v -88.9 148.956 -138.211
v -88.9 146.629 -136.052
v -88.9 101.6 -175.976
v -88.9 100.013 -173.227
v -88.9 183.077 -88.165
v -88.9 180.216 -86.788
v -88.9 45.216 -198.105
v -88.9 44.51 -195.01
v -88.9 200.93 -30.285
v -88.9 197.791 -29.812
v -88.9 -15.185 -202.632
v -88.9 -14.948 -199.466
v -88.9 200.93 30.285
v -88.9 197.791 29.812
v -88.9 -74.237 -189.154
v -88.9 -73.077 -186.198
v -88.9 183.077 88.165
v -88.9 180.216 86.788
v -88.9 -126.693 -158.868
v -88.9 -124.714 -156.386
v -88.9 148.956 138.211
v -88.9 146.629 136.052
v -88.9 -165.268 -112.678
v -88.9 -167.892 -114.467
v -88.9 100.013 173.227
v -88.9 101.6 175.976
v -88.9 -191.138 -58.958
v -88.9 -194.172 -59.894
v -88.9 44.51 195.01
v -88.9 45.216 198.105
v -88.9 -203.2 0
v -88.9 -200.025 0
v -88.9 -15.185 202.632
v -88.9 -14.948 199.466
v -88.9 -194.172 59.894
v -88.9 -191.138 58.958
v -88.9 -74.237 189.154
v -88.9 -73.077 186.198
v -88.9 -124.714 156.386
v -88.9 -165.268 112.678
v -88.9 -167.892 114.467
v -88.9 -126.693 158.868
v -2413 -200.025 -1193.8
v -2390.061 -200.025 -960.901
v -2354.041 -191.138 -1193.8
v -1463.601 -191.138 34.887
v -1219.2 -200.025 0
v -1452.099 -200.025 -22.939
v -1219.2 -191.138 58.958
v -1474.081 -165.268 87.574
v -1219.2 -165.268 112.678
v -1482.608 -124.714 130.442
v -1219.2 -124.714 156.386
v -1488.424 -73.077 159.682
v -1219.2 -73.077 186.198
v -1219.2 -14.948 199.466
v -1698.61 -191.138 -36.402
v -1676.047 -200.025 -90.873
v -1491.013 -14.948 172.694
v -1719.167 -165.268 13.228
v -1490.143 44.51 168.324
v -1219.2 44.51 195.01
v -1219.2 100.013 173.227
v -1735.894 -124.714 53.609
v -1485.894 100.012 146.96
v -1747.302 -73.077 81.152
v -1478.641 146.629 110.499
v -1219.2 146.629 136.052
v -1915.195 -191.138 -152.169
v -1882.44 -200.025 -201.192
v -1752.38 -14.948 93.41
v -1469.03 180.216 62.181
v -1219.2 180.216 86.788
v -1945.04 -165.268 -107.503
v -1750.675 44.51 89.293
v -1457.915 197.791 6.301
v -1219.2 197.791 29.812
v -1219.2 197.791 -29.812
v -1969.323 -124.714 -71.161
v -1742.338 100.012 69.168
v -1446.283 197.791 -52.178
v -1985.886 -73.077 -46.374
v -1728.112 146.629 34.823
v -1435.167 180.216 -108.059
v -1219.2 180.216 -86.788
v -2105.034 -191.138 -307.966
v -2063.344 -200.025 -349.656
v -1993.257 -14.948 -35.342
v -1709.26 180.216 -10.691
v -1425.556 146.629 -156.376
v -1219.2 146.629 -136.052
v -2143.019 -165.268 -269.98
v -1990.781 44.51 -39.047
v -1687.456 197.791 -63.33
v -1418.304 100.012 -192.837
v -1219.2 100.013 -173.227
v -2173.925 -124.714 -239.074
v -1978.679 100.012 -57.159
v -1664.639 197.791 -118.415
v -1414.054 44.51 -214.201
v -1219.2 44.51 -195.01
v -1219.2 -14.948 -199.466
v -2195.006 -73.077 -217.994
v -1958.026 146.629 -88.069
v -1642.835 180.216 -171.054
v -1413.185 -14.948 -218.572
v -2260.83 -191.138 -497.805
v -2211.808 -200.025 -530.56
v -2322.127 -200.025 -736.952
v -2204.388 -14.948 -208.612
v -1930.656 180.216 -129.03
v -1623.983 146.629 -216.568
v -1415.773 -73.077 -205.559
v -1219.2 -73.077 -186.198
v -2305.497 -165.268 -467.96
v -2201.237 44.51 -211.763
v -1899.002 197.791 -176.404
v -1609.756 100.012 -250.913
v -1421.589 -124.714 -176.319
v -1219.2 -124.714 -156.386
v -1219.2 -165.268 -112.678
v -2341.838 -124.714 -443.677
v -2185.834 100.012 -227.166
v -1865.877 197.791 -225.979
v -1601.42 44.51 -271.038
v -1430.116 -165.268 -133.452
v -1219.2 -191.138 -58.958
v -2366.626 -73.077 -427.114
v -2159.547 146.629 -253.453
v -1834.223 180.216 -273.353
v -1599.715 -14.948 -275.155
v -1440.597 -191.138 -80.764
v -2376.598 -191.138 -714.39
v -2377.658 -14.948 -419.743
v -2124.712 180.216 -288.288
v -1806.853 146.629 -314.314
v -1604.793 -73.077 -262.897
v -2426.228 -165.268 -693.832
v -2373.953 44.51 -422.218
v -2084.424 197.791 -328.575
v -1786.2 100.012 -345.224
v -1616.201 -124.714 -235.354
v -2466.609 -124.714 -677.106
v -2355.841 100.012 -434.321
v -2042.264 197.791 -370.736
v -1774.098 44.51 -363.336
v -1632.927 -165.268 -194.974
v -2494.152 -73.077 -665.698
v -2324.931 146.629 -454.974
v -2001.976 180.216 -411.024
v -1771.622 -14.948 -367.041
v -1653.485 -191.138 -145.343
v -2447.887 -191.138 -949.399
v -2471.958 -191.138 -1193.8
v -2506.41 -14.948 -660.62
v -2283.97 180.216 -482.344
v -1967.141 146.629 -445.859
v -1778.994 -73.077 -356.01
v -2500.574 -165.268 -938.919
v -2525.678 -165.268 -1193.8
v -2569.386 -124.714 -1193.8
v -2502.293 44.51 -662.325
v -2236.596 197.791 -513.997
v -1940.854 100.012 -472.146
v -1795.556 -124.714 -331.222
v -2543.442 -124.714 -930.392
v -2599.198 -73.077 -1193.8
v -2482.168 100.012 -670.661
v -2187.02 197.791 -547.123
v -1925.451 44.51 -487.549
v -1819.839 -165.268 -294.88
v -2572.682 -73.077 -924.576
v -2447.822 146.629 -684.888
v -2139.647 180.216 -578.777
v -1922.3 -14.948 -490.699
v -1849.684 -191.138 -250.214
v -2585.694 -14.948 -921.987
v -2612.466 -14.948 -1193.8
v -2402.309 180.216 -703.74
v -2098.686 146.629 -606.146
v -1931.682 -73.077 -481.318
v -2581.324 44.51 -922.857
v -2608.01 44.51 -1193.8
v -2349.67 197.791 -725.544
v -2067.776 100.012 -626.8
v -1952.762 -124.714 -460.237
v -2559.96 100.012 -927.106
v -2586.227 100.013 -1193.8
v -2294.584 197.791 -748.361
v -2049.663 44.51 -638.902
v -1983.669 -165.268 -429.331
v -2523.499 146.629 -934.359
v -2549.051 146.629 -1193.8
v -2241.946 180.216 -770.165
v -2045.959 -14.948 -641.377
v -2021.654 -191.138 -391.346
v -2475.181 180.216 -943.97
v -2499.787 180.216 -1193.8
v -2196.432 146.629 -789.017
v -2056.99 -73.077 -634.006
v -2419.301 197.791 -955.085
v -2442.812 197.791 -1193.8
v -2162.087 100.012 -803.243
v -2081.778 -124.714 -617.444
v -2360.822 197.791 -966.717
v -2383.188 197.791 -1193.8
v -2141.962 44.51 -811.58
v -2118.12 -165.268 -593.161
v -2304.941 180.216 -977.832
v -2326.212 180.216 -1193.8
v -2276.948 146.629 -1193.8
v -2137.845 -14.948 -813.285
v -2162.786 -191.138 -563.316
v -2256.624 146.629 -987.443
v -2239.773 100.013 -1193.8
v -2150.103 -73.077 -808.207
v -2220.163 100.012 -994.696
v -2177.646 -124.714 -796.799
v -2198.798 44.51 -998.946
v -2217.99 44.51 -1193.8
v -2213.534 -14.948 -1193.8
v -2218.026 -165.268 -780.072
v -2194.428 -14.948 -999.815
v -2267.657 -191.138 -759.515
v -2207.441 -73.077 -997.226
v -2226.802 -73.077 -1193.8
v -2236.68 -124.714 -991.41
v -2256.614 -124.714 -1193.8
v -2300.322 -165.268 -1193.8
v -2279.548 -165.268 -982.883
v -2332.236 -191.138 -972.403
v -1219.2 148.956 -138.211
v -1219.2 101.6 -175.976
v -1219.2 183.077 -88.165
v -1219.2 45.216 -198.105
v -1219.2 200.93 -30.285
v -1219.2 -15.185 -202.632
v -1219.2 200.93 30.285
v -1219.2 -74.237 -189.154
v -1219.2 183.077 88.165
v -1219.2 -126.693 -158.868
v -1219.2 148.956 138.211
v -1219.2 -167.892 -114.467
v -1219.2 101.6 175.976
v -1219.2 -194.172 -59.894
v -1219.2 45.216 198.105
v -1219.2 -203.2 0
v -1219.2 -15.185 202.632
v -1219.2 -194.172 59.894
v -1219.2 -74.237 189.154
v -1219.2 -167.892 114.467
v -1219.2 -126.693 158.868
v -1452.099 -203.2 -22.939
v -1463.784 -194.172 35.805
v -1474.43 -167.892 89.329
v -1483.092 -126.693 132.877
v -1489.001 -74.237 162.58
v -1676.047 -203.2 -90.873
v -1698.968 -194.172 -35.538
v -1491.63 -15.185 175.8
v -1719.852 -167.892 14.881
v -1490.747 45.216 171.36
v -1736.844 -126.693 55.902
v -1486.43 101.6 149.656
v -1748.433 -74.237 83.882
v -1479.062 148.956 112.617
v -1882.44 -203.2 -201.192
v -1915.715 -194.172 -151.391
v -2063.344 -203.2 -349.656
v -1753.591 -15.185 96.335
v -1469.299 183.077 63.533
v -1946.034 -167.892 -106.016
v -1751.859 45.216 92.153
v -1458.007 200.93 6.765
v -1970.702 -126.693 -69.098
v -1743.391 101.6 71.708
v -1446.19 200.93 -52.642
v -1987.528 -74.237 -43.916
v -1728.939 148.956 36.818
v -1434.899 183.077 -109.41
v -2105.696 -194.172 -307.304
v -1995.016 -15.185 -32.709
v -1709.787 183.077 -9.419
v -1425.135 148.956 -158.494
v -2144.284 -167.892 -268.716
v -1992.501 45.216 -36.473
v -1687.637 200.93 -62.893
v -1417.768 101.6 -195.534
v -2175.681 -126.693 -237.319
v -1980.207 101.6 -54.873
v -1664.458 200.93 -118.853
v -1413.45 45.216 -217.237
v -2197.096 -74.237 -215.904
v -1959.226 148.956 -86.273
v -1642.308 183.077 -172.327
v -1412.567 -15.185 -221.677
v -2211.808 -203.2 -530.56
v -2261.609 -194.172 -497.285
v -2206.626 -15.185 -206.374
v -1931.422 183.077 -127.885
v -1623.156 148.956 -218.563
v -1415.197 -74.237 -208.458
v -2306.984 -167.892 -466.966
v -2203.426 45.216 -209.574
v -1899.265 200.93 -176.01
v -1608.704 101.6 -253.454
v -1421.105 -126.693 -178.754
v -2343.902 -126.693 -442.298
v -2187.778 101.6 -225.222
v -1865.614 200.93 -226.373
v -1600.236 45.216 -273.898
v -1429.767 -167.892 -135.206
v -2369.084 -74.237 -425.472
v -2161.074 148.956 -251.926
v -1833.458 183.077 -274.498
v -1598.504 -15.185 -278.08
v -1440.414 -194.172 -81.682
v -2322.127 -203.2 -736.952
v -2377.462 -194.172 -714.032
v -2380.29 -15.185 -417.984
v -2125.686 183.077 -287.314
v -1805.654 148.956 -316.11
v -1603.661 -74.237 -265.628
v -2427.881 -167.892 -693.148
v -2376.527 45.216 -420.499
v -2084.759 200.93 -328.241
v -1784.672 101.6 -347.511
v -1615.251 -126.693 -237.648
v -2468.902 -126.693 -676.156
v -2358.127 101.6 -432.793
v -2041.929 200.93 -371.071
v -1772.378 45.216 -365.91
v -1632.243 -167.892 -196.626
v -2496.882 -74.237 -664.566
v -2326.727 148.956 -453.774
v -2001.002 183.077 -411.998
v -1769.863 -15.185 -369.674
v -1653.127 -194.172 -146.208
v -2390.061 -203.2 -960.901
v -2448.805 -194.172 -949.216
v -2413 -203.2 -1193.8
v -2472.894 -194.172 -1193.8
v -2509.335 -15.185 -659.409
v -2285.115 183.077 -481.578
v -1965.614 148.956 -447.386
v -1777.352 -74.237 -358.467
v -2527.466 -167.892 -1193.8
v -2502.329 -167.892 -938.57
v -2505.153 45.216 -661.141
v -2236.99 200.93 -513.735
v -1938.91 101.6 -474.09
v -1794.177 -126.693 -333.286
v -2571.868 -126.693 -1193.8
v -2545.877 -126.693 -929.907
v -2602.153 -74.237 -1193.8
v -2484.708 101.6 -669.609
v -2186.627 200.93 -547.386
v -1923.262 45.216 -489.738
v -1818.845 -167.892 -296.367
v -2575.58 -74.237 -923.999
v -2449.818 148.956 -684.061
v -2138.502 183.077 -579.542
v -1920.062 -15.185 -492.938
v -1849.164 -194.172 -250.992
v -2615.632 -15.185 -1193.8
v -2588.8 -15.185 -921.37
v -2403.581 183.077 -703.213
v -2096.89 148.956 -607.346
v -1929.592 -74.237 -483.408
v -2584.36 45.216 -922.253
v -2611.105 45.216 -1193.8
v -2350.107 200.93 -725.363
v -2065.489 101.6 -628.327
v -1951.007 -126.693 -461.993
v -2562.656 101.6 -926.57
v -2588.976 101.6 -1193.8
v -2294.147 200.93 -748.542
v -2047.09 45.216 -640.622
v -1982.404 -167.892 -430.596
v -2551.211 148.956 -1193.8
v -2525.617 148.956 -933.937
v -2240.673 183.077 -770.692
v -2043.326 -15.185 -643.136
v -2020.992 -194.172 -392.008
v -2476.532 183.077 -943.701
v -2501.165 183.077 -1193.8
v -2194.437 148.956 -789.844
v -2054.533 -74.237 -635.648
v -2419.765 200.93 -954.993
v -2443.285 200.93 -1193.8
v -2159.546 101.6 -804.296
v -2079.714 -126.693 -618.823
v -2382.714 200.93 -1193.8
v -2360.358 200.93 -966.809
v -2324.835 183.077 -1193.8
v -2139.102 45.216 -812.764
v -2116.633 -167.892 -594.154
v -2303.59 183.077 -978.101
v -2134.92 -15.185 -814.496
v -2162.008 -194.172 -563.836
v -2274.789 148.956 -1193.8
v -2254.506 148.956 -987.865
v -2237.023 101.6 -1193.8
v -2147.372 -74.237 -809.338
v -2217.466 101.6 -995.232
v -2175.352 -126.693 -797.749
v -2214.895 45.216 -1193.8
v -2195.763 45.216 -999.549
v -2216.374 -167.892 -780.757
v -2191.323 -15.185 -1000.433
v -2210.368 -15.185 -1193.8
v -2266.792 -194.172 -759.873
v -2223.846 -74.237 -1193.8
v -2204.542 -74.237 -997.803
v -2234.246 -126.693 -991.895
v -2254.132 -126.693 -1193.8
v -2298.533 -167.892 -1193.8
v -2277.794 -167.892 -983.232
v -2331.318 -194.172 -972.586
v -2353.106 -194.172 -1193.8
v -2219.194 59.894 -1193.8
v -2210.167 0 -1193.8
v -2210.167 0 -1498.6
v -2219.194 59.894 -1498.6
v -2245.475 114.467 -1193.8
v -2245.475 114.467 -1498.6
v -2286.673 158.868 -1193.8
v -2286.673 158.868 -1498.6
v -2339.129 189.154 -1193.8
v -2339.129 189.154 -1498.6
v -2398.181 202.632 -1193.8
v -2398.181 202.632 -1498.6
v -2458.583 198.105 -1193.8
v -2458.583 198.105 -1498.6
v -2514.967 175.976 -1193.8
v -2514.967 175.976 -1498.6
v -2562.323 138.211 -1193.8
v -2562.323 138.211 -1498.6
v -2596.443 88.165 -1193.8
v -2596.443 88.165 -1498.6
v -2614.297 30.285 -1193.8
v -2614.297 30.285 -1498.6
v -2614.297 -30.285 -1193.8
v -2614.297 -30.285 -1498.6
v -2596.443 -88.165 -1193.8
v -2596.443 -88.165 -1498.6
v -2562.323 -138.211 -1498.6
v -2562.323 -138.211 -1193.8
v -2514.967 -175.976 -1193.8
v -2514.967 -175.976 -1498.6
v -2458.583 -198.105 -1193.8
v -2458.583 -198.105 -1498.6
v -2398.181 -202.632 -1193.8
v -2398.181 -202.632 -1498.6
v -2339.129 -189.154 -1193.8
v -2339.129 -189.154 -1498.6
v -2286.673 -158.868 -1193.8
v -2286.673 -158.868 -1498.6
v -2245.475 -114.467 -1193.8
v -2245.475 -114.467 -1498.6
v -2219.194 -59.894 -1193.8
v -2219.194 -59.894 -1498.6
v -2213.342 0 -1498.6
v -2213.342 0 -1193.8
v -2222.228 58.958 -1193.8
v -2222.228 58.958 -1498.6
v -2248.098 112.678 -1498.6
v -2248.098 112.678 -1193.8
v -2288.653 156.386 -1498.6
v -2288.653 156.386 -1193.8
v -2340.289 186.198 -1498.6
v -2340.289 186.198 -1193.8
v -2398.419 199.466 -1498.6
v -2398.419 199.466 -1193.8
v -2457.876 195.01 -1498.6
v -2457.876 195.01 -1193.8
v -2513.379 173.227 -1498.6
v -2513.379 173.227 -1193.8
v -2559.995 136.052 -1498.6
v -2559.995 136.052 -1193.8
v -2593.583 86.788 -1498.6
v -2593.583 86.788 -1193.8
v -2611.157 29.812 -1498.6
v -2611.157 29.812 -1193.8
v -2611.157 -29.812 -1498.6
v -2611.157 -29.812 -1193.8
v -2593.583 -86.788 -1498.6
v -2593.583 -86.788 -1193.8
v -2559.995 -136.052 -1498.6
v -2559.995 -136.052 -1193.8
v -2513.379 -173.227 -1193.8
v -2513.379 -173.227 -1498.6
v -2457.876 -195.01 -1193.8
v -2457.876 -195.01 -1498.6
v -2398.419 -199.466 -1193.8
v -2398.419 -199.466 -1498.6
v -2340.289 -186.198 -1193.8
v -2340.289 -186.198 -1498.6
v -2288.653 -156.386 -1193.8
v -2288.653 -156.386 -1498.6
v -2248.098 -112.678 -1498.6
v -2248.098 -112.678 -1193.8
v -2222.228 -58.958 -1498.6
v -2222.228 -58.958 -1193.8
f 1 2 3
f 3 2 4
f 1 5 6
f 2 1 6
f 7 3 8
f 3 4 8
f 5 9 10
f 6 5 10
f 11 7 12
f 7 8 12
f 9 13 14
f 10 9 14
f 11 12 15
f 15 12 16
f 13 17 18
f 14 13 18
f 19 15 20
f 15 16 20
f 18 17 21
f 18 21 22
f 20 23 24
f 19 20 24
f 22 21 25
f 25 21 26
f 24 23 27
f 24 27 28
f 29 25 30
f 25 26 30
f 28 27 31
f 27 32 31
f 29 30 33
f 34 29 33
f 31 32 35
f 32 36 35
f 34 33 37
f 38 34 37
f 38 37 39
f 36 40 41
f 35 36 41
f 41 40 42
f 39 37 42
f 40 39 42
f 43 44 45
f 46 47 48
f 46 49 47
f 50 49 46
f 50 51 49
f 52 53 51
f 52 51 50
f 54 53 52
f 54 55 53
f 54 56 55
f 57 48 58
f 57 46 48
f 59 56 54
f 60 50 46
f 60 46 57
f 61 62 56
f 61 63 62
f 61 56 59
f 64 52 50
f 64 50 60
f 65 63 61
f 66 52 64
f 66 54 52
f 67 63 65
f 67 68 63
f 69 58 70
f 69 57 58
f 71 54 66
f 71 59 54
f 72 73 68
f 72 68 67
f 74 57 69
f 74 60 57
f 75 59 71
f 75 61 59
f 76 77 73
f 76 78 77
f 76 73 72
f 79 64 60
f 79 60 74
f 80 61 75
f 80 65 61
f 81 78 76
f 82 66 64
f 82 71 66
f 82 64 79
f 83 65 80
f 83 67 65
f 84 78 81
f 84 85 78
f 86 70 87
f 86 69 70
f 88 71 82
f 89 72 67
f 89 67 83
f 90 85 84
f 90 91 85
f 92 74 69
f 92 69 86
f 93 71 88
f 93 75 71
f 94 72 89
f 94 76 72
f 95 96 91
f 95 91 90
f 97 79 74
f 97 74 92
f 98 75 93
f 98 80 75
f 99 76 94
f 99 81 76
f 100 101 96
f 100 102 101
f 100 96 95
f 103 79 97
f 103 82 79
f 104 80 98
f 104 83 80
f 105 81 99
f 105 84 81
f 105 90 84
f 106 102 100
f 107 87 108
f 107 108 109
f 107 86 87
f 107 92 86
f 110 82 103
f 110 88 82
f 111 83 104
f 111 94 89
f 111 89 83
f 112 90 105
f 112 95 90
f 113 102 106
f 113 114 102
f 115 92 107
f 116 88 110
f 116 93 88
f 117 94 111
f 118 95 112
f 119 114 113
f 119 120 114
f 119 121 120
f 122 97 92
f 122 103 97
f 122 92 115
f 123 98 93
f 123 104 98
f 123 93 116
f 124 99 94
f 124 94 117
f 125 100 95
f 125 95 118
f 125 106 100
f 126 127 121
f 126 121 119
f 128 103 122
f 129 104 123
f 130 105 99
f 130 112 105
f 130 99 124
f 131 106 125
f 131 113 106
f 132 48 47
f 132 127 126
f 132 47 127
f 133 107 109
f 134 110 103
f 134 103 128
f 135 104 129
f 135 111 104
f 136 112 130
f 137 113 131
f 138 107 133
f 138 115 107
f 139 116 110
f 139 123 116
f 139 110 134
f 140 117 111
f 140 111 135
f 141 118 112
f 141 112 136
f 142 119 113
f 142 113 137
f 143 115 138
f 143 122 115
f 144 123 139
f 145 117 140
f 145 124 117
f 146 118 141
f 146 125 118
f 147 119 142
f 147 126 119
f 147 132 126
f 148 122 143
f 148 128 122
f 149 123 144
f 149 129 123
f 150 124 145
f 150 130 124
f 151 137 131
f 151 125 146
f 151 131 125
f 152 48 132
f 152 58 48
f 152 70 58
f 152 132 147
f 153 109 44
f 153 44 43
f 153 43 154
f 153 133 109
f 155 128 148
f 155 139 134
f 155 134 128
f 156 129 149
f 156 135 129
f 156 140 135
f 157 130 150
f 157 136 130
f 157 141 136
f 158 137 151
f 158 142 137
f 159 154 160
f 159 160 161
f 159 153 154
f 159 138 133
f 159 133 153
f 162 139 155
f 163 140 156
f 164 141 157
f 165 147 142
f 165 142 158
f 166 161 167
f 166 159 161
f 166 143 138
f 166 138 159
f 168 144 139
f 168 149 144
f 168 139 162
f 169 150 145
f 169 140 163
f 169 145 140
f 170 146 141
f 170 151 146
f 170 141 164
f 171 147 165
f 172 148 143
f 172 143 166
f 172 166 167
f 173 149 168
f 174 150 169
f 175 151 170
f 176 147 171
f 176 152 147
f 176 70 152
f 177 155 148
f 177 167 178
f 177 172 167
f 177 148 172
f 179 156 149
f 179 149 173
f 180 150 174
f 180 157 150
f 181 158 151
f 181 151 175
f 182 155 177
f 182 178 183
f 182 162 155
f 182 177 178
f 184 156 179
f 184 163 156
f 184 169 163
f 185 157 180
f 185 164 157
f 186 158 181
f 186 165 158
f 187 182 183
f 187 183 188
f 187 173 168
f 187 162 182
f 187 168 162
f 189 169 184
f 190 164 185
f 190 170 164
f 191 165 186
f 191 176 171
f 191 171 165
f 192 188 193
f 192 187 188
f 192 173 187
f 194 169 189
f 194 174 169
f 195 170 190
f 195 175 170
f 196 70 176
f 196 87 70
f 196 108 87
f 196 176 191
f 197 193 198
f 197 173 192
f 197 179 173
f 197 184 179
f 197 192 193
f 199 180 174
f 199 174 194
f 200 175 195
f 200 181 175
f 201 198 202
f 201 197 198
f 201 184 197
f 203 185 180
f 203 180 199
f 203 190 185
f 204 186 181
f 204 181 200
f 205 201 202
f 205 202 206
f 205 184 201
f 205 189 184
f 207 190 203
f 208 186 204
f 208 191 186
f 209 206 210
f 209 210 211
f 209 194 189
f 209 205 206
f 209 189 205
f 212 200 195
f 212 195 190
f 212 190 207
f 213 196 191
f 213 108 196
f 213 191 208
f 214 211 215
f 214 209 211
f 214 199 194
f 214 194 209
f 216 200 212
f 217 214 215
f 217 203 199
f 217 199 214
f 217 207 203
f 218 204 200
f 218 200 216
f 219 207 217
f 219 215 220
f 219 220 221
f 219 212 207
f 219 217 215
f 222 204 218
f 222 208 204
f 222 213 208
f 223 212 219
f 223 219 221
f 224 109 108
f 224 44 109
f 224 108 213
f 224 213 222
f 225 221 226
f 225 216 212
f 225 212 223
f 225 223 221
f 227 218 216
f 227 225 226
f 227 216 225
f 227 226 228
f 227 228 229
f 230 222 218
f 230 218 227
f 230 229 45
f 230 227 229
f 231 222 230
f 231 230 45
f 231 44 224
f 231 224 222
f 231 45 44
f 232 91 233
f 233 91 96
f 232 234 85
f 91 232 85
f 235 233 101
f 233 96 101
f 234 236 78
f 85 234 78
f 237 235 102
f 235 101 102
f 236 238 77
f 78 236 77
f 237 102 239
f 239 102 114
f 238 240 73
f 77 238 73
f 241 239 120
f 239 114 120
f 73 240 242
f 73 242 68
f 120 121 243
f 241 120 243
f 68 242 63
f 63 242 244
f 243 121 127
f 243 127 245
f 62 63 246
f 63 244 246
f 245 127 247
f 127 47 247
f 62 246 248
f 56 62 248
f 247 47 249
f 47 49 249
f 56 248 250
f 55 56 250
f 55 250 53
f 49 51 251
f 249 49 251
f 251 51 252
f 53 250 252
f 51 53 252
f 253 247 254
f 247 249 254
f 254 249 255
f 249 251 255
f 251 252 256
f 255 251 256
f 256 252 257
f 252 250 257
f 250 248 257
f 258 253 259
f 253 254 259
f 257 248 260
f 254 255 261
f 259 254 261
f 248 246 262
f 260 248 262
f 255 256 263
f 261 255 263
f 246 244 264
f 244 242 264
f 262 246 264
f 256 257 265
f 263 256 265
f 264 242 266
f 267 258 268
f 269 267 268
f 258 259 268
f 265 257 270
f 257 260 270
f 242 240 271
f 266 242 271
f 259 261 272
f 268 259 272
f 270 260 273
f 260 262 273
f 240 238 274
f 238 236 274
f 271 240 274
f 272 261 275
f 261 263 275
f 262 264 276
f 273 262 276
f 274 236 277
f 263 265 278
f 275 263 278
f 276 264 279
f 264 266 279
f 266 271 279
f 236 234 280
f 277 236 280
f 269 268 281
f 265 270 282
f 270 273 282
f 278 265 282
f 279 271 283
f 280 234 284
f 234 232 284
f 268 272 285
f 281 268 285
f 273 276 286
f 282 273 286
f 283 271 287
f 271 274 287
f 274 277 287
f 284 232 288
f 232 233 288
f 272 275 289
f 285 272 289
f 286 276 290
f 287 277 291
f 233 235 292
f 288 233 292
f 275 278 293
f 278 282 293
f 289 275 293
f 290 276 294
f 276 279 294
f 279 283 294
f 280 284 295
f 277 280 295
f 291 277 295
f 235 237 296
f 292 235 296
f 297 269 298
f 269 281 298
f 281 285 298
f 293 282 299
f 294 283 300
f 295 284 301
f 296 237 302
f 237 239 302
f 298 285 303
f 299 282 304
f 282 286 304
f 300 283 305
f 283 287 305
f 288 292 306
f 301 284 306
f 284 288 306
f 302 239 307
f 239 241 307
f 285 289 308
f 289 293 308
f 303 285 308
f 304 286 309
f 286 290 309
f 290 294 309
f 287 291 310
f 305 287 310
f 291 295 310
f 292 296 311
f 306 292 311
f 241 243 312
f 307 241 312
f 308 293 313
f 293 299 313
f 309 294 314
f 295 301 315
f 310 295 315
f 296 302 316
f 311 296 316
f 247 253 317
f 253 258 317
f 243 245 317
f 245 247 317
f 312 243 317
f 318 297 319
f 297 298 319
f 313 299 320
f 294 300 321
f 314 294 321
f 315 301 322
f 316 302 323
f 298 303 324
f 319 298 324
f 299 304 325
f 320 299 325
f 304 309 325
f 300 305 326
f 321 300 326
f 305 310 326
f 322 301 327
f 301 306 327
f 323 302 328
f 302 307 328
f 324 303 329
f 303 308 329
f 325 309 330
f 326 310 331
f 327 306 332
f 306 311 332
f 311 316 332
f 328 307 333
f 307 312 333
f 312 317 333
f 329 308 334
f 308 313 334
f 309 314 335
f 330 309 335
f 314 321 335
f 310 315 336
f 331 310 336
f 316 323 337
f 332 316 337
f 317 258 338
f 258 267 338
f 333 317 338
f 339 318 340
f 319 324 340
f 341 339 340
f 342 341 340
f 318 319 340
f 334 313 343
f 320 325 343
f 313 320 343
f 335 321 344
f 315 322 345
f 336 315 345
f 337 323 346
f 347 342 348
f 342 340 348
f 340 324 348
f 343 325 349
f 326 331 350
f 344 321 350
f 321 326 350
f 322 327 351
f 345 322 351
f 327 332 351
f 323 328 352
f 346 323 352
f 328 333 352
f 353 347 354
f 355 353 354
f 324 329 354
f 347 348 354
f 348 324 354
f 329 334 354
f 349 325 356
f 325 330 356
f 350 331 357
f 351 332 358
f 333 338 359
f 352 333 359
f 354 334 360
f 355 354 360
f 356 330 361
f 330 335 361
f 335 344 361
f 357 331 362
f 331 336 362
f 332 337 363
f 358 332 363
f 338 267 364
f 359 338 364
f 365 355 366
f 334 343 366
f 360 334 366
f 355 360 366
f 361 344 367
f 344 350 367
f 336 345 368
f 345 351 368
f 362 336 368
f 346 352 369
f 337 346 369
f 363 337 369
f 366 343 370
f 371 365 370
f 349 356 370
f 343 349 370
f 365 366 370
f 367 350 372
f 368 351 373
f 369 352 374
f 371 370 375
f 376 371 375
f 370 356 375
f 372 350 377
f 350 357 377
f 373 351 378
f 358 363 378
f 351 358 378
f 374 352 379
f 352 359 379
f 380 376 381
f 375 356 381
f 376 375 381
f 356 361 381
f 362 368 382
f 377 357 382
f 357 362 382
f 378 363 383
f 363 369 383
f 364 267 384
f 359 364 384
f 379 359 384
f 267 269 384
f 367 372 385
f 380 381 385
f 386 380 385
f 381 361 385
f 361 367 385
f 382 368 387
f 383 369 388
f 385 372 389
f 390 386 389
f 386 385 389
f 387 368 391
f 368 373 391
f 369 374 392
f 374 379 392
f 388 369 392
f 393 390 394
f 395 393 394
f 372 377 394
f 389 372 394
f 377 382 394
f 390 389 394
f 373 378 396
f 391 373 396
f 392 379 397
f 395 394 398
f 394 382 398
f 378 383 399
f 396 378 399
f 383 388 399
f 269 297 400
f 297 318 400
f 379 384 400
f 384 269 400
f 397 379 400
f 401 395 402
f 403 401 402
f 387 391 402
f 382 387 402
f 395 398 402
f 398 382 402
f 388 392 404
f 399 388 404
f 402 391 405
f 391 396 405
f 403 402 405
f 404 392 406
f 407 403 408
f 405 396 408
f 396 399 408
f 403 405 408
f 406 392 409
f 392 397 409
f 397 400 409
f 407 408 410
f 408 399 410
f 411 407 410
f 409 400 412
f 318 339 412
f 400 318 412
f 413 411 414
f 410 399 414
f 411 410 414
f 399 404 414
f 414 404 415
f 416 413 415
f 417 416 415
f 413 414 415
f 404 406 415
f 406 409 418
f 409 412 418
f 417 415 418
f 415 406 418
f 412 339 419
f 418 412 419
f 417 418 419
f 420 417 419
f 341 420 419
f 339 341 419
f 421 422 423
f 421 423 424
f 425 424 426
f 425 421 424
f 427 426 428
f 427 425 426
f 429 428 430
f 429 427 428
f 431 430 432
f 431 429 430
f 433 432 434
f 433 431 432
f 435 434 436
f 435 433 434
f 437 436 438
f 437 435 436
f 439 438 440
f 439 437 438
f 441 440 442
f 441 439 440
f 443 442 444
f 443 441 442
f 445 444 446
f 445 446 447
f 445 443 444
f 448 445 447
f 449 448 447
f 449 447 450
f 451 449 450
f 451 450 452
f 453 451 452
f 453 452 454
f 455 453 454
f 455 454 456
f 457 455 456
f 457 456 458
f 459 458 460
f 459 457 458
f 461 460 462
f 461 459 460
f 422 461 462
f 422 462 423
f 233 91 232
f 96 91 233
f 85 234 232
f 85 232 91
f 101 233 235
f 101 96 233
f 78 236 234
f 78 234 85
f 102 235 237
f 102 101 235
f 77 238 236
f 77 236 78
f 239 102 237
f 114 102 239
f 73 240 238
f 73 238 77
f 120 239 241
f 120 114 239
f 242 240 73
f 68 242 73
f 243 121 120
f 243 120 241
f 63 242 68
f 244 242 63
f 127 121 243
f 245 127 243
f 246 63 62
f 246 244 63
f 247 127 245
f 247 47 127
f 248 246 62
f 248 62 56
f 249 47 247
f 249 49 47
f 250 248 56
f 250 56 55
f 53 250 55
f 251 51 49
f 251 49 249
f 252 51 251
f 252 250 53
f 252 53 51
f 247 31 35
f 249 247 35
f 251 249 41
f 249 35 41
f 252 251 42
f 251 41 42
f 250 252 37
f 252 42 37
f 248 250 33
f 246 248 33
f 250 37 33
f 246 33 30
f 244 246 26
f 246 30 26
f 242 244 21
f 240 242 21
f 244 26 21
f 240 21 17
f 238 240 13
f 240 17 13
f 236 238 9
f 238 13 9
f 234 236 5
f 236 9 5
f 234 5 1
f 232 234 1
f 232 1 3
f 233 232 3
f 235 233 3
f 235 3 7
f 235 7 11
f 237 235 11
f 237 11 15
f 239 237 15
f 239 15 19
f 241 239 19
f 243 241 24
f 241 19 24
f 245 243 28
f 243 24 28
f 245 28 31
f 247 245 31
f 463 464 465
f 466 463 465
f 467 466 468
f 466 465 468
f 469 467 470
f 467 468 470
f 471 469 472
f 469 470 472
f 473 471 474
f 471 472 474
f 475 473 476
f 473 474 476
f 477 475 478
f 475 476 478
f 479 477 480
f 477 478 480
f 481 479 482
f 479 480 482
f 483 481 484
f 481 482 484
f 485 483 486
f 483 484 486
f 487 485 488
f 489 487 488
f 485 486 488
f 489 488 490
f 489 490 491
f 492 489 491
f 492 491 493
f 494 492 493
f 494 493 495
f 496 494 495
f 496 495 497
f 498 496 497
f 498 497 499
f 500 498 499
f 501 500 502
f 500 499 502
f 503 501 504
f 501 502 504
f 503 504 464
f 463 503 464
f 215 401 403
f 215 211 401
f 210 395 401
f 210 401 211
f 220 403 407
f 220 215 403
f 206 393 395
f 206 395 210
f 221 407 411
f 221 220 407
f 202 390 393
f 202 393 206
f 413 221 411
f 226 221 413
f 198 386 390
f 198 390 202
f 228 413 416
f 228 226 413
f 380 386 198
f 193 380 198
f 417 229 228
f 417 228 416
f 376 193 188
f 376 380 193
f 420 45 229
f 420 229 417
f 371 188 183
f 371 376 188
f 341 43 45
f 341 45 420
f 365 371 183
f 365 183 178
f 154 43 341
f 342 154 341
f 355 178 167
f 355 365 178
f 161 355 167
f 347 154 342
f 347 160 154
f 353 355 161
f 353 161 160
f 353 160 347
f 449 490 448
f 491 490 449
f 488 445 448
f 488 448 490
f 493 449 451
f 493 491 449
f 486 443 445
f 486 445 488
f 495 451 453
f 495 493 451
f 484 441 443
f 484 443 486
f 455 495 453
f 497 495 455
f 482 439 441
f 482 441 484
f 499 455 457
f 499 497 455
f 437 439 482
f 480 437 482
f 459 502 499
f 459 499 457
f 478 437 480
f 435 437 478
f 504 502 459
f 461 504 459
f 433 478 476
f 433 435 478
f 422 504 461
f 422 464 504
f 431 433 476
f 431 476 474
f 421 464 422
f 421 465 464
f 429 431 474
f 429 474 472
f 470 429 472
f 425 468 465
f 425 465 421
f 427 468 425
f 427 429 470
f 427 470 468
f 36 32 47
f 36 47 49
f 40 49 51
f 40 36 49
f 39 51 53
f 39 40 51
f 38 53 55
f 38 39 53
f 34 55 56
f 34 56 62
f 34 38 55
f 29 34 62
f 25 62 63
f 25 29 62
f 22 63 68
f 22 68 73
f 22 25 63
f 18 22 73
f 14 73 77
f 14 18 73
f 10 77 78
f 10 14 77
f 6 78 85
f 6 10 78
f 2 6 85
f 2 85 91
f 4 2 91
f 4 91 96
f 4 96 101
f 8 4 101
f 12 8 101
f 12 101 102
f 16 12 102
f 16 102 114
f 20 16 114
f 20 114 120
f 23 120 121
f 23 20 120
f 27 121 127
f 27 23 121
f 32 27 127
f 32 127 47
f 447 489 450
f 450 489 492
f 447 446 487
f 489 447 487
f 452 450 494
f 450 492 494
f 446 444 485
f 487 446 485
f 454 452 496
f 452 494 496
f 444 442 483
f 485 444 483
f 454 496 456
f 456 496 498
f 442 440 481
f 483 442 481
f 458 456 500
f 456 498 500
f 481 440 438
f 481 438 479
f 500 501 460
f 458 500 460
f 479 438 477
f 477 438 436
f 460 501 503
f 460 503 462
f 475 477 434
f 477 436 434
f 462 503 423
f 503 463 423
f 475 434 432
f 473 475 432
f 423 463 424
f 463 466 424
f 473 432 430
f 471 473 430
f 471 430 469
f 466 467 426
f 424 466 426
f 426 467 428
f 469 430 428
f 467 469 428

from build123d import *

# Parameters (mm, degrees)
F4_R      = 203.2
F4_R_2    = 200.025
F5_DEPTH  = 1130.3
F6_R      = 200.025
F7_ANGLE  = 90
F9_DEPTH  = 304.8
F6_R_2    = 203.2
F11_ANGLE = 90
F8_R      = 203.2
F8_R_2    = 200.025
F13_DEPTH = 304.8


with BuildPart() as f5:
    # F4 (on line) → F5 (new body)
    with BuildSketch(Plane(origin=(-88.9, 0, 0), x_dir=(0, -1, 0), z_dir=(-1, 0, 0))):
        Circle(F4_R)
        Circle(F4_R_2, mode=Mode.SUBTRACT)
    extrude(amount=F5_DEPTH)


with BuildPart() as f7:
    # F6 (on line) → F7 (revolve)
    with BuildSketch(Plane(origin=(-1219.2, 0, 0), x_dir=(0, -1, 0), z_dir=(-1, 0, 0))):
        Circle(F6_R)
    revolve(axis=Axis((-1219.2, -101.6, -1193.7998533249), (0, -1, 0)), revolution_arc=F7_ANGLE)


with BuildPart() as f9:
    # F9 (new): a face of the model
    f9_faces = [f7.part.faces().sort_by_distance(p)[0] for p in [
        (-2412.9998533249, 0, -1193.7998533249),
    ]]
    extrude(f9_faces, amount=F9_DEPTH)


with BuildPart() as f11:
    # F6 (on line) → F11 (revolve)
    with BuildSketch(Plane(origin=(-1219.2, 0, 0), x_dir=(0, -1, 0), z_dir=(-1, 0, 0))):
        Circle(F6_R_2)
        Circle(F6_R, mode=Mode.SUBTRACT)
    revolve(axis=Axis((-1219.2, -101.6, -1193.7998533249), (0, -1, 0)), revolution_arc=F11_ANGLE)


with BuildPart() as f13:
    # F8 (on line) → F13 (new body)
    with BuildSketch(Plane.XY.offset(-1193.8)):
        with Locations((-2413.3665561676, 0)):
            Circle(F8_R)
        with Locations((-2413.3665561676, 0)):
            Circle(F8_R_2, mode=Mode.SUBTRACT)
    extrude(amount=-F13_DEPTH)


solid = Compound([f5.part, f11.part, f13.part])
